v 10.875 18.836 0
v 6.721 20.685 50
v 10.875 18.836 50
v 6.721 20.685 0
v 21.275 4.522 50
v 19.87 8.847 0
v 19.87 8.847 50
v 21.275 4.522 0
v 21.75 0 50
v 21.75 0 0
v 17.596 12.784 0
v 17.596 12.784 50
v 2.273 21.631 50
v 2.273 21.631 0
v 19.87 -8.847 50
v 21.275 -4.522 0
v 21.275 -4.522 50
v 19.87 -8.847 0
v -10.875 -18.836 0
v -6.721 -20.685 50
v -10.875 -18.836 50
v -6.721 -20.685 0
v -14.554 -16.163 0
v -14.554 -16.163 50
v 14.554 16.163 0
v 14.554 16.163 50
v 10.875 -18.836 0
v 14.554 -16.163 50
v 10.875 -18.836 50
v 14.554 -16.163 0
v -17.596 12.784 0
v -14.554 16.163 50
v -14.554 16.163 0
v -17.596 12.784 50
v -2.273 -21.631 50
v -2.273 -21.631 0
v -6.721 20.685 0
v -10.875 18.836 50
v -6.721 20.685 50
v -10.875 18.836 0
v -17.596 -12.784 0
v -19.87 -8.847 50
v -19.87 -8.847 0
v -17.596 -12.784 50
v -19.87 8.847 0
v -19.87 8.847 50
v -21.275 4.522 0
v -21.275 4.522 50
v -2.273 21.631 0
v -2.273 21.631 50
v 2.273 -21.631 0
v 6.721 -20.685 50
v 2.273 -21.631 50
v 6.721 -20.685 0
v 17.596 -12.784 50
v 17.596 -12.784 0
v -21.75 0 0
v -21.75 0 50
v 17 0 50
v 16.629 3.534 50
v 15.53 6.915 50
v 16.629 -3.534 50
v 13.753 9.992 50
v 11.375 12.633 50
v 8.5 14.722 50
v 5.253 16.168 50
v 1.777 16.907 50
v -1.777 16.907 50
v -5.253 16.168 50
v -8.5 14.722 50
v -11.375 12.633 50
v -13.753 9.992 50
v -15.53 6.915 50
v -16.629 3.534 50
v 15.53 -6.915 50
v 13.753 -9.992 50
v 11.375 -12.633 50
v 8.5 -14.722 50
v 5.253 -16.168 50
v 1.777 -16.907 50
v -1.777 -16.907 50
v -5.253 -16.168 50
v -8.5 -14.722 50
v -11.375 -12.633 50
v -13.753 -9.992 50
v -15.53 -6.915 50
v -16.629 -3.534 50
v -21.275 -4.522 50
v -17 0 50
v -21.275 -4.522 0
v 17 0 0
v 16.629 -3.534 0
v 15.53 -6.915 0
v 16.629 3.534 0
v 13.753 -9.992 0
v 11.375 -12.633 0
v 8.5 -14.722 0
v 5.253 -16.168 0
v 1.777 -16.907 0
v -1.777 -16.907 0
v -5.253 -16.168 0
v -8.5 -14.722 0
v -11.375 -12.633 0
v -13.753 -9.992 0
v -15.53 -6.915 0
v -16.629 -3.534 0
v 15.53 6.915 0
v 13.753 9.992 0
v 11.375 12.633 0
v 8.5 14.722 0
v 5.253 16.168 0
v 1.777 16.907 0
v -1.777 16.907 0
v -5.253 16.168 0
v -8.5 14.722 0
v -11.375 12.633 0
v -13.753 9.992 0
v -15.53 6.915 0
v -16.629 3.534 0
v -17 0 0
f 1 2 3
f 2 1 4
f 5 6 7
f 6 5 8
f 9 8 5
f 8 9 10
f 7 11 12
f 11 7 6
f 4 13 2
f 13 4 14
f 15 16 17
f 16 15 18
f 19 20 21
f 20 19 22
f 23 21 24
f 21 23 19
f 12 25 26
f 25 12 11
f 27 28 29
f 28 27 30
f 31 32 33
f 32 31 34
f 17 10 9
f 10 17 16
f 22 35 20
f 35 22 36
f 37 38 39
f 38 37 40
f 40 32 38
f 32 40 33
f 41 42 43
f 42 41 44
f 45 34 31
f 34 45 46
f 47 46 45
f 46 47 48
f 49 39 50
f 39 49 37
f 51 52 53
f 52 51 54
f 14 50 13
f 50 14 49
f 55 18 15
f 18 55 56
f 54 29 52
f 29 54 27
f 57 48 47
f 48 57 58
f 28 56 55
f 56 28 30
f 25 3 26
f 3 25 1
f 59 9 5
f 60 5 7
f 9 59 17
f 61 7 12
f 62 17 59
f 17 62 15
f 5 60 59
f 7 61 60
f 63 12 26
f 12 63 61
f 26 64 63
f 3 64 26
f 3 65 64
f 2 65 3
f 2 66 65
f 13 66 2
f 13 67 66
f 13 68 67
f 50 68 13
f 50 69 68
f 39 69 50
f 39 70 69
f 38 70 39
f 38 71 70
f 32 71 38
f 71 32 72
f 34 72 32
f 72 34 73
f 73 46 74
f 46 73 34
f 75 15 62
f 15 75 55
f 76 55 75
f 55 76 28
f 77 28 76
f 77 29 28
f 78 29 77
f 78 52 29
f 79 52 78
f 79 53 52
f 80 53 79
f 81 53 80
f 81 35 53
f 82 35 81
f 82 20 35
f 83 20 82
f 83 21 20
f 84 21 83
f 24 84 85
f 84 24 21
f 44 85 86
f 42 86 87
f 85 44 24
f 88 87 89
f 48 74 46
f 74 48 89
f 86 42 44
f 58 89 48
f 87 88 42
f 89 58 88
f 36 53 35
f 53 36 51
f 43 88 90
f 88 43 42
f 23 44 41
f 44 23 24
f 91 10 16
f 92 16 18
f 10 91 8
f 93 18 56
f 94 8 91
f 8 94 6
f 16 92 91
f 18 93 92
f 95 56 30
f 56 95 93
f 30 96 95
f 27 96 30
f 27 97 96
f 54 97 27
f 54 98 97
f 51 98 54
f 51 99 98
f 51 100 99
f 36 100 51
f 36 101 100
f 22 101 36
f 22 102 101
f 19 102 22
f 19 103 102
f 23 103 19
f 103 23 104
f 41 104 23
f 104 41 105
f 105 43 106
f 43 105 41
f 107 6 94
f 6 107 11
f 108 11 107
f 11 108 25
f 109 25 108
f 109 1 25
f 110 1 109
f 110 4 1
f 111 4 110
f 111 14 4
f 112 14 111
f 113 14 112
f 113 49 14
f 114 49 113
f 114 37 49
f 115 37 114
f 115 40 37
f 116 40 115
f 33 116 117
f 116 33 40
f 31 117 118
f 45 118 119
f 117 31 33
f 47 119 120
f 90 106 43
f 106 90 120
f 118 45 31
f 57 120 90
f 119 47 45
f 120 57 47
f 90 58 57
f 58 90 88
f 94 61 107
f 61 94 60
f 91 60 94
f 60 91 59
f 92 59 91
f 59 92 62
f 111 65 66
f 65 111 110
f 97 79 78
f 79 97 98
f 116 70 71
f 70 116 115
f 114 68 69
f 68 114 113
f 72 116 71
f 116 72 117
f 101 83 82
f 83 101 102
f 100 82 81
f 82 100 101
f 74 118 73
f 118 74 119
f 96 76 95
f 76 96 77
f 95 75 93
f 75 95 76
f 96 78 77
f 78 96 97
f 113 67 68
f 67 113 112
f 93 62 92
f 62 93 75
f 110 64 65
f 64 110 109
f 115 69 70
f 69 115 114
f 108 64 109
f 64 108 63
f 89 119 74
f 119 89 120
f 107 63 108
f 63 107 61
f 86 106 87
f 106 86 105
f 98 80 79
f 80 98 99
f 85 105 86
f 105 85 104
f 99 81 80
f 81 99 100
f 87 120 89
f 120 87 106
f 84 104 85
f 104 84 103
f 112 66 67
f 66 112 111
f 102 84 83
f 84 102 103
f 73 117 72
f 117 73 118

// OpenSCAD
difference(){
	cylinder(50, 21.75, 21.75);
	cylinder(50, 17, 17);
	//cylinder(45, 16, 16);
}
